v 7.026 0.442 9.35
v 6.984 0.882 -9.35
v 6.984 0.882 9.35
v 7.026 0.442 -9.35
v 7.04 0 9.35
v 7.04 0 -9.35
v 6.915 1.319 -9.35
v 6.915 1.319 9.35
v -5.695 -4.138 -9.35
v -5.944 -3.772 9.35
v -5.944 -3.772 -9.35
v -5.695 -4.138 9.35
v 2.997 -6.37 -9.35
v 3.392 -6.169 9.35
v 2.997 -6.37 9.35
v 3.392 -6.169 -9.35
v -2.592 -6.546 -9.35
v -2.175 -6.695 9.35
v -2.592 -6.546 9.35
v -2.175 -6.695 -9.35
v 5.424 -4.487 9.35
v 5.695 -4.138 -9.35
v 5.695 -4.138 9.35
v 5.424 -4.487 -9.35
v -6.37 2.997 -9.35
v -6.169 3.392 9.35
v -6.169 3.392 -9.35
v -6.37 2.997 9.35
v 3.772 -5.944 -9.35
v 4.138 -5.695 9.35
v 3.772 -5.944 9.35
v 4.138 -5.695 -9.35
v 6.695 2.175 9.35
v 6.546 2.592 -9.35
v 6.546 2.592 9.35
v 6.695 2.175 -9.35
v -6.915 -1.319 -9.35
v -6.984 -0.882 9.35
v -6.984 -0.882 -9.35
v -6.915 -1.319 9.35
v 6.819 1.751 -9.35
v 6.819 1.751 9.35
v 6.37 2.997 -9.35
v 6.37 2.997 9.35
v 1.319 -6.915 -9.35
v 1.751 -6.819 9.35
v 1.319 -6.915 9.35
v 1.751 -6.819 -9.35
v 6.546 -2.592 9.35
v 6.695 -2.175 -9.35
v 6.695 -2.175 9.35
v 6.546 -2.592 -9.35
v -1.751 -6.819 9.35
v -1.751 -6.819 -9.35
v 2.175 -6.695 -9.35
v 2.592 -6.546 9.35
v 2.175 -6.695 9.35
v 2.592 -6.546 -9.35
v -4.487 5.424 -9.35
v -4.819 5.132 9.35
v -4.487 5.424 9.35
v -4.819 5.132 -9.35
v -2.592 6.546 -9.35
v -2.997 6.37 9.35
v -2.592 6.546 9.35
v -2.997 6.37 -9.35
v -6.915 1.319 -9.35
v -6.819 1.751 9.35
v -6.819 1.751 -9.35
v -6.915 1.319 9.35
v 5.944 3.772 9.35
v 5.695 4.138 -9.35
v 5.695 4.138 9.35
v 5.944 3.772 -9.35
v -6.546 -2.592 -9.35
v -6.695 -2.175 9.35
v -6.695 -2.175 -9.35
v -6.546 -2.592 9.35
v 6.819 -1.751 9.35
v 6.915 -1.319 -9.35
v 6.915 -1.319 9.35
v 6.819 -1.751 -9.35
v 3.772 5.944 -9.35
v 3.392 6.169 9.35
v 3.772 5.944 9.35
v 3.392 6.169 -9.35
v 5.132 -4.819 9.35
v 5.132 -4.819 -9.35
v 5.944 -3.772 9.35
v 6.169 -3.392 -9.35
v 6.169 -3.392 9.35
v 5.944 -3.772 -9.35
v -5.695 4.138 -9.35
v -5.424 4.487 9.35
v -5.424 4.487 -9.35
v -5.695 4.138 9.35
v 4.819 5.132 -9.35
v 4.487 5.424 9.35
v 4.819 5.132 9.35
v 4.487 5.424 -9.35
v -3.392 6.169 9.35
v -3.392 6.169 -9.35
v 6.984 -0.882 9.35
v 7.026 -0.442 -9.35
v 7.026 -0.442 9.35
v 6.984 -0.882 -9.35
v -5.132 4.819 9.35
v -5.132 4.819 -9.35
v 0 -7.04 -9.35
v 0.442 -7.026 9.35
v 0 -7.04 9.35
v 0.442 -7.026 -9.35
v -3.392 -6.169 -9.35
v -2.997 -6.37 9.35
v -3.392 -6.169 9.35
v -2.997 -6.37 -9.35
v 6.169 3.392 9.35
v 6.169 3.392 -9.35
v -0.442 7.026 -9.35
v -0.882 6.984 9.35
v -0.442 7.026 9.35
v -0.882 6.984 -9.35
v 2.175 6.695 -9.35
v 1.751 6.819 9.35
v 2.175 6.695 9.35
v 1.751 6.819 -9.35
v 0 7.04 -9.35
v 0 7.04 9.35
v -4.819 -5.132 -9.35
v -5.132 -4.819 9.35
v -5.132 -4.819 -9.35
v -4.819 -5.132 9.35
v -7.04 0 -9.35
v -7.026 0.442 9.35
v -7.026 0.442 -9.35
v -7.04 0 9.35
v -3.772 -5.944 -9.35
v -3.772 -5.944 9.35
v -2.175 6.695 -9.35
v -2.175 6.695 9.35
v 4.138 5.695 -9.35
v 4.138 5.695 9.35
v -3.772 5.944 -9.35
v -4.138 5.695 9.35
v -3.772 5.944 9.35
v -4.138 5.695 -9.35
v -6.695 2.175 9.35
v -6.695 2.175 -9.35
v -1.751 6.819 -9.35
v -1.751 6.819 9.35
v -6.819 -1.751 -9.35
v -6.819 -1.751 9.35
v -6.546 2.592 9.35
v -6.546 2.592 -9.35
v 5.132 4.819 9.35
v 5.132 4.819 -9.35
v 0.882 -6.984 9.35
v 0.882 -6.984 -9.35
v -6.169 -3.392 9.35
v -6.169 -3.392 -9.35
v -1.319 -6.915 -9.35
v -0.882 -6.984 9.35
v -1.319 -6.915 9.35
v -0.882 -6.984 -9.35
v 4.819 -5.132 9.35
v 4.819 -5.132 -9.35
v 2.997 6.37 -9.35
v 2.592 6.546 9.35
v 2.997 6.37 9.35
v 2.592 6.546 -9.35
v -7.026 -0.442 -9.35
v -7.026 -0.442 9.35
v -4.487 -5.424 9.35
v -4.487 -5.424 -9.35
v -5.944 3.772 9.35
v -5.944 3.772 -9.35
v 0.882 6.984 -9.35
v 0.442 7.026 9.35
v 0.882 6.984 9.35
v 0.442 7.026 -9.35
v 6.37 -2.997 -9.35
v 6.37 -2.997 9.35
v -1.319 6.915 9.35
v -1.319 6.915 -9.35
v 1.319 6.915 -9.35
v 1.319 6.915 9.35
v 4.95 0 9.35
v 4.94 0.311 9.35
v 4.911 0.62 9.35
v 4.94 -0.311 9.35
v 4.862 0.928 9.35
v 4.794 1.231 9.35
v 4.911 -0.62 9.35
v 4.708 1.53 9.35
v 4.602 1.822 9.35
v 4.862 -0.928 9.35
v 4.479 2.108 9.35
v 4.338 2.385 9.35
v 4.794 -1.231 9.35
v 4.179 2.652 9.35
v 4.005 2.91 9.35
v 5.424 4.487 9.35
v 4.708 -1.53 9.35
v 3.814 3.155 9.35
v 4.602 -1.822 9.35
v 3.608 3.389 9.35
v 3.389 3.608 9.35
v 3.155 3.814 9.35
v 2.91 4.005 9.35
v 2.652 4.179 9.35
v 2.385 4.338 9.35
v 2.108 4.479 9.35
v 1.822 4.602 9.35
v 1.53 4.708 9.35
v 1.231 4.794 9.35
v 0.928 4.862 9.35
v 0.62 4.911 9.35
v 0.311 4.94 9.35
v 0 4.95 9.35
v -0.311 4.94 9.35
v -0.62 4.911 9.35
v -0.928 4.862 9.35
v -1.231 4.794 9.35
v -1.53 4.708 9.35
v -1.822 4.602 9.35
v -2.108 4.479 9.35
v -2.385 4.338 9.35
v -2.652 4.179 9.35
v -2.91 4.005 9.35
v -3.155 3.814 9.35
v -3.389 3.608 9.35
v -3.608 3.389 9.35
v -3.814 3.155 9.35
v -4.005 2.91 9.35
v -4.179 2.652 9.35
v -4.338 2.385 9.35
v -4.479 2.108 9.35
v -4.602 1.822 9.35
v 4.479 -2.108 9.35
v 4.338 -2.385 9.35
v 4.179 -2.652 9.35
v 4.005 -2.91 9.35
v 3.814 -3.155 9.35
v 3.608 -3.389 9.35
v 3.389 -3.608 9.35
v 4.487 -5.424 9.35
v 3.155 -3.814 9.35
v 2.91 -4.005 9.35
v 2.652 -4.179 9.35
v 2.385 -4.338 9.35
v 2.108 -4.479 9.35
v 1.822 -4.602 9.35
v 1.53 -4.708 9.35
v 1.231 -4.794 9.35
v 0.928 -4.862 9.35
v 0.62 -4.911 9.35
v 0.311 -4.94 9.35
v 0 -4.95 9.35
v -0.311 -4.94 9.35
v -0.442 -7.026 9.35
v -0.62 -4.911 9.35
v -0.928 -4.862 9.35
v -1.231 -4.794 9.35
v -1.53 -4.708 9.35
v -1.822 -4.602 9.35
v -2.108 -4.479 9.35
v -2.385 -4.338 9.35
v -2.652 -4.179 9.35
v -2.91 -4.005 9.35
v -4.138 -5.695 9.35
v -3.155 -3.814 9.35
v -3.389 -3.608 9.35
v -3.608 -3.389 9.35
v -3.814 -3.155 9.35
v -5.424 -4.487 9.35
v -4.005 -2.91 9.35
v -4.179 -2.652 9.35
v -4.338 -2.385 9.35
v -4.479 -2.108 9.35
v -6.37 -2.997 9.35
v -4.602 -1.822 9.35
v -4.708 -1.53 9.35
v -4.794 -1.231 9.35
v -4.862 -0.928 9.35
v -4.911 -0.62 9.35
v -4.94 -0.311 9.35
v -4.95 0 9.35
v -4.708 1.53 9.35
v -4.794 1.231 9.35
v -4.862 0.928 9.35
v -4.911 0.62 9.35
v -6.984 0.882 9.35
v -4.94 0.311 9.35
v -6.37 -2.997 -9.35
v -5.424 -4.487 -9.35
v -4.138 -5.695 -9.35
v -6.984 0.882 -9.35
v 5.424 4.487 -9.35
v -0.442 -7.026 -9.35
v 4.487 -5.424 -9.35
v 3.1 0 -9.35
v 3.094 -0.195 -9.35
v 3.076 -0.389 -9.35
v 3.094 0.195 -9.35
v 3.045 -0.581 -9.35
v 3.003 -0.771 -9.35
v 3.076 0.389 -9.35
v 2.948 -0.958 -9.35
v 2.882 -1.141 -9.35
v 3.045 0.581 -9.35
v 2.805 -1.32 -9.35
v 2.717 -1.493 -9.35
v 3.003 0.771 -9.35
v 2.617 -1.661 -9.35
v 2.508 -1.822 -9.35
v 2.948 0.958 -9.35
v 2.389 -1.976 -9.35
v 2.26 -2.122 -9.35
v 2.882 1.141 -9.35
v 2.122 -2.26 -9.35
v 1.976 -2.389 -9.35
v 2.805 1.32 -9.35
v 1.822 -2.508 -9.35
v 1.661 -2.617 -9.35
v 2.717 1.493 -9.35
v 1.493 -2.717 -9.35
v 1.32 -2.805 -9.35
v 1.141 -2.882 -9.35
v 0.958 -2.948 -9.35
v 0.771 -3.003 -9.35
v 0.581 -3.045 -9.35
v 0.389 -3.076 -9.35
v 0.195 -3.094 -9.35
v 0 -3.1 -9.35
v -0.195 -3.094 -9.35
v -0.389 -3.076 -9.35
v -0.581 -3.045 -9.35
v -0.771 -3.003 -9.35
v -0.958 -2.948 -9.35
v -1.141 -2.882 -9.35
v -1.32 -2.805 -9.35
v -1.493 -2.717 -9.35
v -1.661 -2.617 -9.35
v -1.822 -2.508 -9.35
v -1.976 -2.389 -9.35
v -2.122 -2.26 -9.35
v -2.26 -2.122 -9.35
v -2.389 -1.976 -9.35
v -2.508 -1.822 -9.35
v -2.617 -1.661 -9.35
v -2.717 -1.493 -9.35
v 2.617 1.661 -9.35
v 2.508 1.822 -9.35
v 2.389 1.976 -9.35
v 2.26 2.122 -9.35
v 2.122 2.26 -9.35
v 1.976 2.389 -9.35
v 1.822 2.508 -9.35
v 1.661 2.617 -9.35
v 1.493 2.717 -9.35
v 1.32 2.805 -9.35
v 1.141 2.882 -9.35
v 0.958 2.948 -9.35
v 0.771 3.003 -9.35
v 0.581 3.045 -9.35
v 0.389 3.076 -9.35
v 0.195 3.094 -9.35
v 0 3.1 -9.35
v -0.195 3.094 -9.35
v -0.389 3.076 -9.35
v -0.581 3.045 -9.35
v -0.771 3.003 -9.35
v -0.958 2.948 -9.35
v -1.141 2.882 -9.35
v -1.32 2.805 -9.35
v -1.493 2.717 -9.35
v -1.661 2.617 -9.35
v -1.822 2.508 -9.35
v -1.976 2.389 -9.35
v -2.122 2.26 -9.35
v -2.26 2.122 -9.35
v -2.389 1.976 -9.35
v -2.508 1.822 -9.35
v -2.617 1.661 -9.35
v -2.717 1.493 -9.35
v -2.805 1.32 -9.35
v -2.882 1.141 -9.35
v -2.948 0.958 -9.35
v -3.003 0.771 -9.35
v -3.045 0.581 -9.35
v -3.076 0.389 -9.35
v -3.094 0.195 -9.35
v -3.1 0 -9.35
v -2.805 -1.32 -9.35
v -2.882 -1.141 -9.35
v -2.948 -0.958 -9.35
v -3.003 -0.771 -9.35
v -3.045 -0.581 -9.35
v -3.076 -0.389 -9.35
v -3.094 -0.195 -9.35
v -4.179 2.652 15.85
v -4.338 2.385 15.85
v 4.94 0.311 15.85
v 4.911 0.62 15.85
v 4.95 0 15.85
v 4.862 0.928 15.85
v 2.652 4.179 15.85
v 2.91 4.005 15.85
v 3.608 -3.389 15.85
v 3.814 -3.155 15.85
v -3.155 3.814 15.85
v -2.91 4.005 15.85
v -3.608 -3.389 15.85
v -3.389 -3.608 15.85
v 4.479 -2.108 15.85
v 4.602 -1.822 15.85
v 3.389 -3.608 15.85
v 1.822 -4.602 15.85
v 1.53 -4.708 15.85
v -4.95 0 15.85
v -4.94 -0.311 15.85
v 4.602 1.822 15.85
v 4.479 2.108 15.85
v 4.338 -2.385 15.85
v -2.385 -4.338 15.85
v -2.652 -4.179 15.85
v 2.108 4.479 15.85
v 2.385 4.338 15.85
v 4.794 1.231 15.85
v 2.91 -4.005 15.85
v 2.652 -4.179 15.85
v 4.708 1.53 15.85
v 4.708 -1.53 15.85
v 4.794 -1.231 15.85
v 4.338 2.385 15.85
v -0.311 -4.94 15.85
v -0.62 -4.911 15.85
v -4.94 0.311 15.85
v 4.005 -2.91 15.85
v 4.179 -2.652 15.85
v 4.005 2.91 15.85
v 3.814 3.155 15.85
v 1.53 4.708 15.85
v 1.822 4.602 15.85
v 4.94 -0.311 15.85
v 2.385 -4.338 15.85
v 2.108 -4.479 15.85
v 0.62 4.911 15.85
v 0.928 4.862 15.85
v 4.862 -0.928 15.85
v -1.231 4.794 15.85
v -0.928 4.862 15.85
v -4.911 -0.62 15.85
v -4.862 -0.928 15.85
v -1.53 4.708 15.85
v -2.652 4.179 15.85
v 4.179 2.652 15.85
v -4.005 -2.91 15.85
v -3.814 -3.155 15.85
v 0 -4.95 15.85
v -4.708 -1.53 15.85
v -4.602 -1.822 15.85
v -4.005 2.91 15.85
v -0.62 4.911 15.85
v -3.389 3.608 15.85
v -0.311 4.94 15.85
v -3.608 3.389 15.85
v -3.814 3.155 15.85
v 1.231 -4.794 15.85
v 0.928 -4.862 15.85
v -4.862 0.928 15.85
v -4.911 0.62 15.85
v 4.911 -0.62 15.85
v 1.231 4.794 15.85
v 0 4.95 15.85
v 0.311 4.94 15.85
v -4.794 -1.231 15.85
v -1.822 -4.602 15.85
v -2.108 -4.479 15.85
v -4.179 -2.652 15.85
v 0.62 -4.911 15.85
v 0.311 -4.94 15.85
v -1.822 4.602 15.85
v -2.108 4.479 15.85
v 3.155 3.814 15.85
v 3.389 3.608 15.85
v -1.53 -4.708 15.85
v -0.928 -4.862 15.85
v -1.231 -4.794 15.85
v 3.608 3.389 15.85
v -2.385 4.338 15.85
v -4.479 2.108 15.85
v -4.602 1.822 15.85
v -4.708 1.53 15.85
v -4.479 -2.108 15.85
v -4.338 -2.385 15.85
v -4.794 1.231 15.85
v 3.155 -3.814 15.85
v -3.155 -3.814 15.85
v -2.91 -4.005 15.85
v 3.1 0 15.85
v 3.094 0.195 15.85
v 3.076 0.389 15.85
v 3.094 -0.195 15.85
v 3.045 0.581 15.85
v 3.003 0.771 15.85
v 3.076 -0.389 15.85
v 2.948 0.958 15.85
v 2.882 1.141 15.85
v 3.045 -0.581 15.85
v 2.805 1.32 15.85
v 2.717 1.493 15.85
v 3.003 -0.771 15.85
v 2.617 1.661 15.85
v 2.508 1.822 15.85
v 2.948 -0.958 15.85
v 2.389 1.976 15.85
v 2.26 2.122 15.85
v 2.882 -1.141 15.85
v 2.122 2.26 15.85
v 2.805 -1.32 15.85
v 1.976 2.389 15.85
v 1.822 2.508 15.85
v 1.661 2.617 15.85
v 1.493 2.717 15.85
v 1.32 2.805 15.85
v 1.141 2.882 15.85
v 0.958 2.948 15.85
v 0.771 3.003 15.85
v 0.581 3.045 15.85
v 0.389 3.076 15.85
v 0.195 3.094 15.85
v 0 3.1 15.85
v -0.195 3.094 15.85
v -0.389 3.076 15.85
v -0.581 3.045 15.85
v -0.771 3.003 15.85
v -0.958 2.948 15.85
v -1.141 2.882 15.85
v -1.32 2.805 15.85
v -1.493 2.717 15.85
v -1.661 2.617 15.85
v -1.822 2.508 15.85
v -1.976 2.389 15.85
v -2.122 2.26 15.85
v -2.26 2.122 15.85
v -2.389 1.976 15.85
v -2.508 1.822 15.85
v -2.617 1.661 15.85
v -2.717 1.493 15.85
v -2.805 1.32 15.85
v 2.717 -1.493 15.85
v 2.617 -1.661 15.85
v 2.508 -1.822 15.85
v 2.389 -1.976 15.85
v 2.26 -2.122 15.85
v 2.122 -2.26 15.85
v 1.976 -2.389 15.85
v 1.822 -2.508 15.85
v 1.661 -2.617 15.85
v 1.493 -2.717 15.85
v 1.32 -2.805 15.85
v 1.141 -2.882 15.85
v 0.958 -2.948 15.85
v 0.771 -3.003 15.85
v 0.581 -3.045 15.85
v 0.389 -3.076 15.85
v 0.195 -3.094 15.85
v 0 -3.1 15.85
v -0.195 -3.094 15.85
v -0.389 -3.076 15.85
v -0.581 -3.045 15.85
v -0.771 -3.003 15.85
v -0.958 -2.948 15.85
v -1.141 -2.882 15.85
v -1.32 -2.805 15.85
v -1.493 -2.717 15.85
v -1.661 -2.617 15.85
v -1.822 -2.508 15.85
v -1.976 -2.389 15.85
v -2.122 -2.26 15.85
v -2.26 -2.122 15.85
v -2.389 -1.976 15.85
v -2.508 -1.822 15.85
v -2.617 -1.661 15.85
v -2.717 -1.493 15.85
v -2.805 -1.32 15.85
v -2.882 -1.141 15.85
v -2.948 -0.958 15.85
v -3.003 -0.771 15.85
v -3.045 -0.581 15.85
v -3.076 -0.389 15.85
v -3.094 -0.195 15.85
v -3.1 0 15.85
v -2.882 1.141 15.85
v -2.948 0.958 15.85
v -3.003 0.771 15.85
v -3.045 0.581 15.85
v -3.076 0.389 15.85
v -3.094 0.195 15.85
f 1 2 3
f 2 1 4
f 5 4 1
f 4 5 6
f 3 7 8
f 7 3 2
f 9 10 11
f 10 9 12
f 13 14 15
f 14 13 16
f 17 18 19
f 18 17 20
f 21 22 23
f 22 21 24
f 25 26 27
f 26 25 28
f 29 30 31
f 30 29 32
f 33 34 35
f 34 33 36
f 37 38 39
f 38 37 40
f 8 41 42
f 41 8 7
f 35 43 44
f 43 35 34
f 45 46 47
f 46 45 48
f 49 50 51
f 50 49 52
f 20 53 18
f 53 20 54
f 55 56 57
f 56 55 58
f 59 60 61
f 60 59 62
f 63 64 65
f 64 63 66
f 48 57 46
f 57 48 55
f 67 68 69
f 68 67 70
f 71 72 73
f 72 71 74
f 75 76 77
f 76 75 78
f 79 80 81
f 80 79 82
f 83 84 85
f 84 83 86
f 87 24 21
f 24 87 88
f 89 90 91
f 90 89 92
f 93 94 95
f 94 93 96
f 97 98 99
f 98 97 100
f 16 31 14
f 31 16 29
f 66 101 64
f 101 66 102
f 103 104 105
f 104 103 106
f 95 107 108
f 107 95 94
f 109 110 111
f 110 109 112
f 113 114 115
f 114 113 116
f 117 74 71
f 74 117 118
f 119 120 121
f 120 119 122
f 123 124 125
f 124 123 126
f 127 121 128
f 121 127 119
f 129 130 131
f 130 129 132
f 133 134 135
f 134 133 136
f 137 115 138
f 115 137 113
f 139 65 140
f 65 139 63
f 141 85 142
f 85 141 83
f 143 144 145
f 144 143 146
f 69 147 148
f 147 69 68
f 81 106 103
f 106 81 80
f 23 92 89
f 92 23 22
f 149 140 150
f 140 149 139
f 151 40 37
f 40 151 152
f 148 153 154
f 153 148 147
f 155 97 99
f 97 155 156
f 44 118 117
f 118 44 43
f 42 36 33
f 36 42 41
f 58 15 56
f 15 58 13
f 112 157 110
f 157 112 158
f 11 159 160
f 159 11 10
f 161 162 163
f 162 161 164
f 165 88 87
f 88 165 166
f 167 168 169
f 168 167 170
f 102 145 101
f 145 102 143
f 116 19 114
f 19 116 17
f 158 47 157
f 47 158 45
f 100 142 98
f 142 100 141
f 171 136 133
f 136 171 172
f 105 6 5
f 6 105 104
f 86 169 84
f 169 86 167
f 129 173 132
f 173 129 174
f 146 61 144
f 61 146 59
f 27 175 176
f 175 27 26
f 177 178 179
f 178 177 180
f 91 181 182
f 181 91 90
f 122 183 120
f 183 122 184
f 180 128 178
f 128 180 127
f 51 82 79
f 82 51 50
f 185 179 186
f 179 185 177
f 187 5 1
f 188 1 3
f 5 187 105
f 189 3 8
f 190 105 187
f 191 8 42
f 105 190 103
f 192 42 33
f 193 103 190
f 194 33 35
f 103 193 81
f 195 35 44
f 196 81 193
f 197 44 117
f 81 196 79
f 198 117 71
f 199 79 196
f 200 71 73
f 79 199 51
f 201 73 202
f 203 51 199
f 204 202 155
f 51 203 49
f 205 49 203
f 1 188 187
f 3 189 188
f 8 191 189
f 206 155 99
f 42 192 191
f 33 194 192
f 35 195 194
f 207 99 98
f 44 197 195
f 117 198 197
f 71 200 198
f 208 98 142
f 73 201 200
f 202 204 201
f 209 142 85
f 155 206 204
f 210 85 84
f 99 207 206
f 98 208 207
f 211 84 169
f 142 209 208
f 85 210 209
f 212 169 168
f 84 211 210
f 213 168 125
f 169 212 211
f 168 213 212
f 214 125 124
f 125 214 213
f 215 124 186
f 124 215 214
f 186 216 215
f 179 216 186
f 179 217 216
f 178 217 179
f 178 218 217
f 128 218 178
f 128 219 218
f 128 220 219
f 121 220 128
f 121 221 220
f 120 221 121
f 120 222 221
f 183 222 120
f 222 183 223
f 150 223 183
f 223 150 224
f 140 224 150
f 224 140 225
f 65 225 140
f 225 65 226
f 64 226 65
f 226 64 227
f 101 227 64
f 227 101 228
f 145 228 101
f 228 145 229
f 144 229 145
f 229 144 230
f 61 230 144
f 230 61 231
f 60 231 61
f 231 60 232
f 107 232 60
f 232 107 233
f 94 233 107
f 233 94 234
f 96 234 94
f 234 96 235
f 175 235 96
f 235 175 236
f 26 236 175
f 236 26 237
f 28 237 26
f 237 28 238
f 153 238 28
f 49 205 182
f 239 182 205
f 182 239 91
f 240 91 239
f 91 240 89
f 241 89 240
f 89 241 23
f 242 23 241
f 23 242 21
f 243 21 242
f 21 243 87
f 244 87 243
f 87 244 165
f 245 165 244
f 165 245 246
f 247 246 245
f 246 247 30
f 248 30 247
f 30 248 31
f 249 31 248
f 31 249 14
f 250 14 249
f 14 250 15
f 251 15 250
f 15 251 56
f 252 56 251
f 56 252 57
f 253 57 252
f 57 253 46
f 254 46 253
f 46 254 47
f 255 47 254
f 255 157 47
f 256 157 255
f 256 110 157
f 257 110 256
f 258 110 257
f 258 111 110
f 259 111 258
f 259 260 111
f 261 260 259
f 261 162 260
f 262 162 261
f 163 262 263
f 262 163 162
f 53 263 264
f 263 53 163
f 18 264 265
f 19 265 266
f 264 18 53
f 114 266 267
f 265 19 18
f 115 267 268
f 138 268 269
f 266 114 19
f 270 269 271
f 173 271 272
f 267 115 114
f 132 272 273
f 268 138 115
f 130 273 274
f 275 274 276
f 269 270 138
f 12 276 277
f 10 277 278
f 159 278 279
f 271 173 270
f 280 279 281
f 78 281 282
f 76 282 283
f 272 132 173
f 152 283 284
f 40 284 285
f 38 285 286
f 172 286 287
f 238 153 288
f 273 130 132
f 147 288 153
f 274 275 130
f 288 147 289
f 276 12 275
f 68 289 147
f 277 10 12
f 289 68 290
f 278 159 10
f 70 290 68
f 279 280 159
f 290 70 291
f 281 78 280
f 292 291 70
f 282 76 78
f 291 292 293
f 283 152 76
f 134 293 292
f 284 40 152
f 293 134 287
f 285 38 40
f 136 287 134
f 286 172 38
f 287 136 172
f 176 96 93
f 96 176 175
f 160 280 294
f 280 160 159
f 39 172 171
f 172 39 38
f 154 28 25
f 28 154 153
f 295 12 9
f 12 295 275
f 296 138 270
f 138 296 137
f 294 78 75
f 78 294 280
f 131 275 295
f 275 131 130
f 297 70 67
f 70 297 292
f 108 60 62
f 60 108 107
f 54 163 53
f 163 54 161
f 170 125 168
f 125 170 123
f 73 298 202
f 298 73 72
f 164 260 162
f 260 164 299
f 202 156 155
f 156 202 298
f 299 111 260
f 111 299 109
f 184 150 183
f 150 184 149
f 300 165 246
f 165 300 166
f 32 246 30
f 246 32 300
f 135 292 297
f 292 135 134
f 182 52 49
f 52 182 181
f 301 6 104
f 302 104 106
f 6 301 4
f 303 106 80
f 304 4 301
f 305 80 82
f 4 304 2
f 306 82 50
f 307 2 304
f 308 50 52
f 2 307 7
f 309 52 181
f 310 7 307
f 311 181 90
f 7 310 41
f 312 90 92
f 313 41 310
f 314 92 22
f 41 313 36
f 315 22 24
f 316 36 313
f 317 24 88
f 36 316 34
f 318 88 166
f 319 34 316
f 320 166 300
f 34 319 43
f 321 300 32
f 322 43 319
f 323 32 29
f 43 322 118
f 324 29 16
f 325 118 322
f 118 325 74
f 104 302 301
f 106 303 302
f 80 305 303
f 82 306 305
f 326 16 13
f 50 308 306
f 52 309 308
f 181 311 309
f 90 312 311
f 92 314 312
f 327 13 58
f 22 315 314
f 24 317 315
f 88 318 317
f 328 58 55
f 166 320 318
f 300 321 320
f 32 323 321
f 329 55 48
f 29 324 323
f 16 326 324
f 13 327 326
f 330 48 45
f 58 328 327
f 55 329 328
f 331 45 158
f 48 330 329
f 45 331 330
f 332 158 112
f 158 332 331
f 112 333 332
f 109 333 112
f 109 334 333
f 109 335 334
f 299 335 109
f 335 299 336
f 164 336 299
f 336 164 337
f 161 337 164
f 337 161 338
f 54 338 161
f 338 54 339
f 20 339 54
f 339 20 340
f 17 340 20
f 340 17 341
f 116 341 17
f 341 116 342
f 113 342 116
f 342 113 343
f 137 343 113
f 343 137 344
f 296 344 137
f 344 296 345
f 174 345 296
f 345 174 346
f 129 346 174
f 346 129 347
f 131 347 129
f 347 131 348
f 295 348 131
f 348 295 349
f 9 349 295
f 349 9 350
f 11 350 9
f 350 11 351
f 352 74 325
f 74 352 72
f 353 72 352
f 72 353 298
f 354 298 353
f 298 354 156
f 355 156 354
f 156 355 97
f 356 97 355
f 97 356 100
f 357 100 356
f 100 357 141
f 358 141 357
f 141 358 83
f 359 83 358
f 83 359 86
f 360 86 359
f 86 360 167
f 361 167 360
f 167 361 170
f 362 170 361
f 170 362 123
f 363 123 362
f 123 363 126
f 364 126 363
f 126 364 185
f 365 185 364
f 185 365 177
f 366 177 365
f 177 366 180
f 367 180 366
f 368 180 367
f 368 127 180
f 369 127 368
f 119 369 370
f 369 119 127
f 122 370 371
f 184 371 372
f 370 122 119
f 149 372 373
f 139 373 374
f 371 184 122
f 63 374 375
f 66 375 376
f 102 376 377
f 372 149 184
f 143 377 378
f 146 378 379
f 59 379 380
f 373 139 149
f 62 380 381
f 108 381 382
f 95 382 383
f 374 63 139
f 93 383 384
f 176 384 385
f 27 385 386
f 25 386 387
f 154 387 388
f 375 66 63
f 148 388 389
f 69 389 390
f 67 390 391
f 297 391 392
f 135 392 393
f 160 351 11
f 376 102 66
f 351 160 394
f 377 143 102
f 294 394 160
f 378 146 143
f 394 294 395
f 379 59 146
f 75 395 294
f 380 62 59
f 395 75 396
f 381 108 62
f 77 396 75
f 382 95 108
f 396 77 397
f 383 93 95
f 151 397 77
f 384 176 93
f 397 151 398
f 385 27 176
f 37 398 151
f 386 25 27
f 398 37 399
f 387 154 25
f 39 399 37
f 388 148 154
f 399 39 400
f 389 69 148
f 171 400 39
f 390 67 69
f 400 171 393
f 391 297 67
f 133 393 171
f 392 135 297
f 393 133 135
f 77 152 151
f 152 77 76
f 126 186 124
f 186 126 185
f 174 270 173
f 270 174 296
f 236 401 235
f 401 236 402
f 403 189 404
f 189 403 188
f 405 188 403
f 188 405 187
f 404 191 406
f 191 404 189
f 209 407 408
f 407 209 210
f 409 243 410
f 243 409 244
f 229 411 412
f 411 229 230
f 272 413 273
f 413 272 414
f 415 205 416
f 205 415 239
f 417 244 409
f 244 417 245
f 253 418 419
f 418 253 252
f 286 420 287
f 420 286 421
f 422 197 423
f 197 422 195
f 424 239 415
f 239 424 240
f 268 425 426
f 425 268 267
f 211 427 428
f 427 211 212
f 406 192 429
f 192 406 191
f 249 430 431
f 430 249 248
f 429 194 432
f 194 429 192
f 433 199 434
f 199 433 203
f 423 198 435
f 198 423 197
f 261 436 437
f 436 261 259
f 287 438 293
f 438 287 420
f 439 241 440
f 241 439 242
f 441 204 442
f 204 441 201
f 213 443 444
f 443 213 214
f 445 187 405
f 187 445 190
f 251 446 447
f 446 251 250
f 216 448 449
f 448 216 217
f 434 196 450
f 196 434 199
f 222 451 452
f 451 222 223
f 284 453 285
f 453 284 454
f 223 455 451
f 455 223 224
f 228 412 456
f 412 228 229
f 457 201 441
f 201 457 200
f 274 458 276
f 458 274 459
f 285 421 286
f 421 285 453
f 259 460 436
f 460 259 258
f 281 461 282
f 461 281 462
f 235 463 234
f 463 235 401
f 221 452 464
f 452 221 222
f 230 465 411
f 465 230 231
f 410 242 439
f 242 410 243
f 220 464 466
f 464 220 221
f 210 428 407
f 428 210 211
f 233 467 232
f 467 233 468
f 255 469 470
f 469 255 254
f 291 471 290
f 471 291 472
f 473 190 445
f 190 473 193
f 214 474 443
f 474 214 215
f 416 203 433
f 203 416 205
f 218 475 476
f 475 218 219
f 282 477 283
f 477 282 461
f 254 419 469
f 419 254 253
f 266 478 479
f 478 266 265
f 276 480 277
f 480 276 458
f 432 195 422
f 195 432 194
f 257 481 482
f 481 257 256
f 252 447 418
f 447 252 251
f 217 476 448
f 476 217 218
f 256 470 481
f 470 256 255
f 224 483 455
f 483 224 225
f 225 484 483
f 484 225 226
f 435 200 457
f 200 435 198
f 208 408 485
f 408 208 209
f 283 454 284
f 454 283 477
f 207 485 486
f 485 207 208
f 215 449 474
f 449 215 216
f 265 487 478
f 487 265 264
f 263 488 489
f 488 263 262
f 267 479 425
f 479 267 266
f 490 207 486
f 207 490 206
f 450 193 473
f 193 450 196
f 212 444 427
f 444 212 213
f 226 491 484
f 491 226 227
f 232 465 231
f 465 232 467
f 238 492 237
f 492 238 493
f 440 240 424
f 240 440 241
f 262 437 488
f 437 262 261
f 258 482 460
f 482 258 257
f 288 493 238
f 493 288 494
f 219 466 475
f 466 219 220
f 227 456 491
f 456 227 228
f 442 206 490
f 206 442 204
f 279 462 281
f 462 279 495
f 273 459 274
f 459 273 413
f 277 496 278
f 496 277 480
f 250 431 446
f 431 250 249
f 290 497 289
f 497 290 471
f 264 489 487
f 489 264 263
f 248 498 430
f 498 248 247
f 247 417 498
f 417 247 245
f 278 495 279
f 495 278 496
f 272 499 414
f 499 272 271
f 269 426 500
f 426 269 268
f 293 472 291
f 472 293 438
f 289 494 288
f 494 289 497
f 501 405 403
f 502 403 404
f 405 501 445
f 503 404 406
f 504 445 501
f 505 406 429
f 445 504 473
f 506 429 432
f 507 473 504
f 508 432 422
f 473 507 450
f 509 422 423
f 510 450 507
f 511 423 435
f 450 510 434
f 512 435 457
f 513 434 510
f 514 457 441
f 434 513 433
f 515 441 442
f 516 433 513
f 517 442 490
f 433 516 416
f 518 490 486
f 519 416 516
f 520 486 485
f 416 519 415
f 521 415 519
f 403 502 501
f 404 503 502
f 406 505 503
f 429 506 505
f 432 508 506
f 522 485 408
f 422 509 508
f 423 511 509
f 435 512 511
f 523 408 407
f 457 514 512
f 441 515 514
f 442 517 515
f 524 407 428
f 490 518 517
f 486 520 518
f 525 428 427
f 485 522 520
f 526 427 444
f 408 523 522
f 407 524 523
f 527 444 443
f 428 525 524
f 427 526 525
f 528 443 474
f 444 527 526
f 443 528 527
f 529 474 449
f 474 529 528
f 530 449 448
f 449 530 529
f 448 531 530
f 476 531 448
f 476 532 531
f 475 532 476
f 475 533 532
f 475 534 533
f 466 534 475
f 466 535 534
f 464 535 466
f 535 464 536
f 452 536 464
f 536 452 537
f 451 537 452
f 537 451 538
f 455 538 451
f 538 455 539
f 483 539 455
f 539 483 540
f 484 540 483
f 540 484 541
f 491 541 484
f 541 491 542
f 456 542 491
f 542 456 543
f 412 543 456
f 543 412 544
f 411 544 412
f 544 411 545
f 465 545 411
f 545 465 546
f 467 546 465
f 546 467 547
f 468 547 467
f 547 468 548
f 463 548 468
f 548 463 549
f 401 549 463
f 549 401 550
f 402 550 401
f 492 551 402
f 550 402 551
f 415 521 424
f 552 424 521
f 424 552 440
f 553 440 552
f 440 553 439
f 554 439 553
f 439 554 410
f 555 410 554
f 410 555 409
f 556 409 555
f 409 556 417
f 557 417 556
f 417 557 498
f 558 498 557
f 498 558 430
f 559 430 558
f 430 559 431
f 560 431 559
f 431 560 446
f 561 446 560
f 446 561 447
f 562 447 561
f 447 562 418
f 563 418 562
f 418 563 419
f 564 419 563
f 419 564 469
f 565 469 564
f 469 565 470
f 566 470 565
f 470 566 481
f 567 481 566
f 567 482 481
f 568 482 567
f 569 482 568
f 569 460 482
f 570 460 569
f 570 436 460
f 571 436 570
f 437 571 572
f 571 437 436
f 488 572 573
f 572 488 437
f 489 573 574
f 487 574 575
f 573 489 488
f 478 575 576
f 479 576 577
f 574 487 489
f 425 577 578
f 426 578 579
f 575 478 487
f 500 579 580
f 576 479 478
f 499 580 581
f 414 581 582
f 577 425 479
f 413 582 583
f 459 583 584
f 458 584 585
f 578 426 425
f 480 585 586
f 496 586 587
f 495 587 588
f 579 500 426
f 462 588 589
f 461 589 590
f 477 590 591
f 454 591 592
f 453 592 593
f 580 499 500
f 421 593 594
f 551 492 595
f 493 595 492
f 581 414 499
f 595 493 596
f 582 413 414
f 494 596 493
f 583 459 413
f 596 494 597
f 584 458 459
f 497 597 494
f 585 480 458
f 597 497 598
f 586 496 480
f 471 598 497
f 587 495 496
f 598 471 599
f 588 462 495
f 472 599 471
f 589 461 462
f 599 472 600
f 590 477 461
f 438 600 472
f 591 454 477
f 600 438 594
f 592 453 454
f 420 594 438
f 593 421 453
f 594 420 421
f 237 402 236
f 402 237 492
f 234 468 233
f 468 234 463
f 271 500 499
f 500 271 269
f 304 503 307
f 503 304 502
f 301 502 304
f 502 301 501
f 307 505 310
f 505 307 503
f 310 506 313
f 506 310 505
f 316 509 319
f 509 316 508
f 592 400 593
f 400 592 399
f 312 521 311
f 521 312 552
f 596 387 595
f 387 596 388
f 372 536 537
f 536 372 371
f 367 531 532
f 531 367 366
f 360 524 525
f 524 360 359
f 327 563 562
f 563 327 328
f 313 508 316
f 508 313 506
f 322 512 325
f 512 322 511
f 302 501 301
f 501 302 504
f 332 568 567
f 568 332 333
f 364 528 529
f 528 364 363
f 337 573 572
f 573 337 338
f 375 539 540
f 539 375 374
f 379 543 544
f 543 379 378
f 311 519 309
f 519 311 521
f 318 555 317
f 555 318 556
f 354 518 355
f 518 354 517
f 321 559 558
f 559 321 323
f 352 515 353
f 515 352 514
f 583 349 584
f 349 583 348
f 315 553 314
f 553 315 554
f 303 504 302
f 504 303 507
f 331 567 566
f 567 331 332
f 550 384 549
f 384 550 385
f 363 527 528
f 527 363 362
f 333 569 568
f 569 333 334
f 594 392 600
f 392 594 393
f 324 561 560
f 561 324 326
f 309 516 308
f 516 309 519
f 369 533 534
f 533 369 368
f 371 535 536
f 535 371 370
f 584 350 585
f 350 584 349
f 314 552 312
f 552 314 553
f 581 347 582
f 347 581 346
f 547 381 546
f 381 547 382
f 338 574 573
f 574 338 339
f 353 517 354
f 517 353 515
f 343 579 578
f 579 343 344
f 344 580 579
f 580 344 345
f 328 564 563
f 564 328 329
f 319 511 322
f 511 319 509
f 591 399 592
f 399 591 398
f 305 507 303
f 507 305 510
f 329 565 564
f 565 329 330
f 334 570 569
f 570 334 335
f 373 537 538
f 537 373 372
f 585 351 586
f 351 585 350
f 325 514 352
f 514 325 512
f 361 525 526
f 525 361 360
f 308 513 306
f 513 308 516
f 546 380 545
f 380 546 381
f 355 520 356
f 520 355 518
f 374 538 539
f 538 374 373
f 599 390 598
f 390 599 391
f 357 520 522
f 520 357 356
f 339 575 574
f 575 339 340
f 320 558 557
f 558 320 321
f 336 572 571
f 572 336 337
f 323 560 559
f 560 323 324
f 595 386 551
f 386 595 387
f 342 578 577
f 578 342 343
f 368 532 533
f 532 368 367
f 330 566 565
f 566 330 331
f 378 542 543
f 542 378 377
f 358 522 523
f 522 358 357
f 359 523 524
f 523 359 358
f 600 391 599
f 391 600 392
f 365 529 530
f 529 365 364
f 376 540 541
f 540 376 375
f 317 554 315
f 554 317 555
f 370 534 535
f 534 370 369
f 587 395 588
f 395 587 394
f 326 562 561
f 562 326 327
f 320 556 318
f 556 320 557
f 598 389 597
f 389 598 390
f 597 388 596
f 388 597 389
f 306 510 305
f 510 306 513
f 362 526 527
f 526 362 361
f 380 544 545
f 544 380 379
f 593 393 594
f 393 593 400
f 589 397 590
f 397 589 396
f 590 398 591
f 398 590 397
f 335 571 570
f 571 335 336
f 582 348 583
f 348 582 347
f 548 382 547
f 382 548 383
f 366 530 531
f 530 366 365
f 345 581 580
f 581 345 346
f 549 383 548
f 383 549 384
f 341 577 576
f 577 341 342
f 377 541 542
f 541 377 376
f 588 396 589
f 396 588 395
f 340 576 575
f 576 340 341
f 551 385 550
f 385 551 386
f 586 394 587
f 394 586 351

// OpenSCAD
// This is a Givi spacer.
//
// Warning -- some sanding and fitting may be required.
//
// This is licensed under the creative commons+attribution license
//
// To fulfil the attribution requirement, please link to:
// http://www.thingiverse.com/thing:2179704

/* [Main] */

// Define number of facets (large numbers provide better smoothing)
$fn=100;

// Define height of lower cylinder in mm
height01=18.7;

// Define total height cylinder in mm
height02=25.2;

// Define outside diameter of upper cylinder in mm
diameter01=9.9;

// Define outside diameter of lower cylinder in mm
diameter02=14.08;

// Define inside diameter of hole in mm
inside_diameter=6.2;

difference()
{
	union() // Draw outer shape
	{
		translate([0,0,0])                     cylinder(h=height01,r=diameter02/2,center=true);
		translate([0,0,(height02-height01)/2]) cylinder(h=height02,r=diameter01/2,center=true);
	}
	// Drill hole
	#translate([0,0,(height02-height01)/2]) cylinder(h=height02+1,r=inside_diameter/2,center=true);
}
